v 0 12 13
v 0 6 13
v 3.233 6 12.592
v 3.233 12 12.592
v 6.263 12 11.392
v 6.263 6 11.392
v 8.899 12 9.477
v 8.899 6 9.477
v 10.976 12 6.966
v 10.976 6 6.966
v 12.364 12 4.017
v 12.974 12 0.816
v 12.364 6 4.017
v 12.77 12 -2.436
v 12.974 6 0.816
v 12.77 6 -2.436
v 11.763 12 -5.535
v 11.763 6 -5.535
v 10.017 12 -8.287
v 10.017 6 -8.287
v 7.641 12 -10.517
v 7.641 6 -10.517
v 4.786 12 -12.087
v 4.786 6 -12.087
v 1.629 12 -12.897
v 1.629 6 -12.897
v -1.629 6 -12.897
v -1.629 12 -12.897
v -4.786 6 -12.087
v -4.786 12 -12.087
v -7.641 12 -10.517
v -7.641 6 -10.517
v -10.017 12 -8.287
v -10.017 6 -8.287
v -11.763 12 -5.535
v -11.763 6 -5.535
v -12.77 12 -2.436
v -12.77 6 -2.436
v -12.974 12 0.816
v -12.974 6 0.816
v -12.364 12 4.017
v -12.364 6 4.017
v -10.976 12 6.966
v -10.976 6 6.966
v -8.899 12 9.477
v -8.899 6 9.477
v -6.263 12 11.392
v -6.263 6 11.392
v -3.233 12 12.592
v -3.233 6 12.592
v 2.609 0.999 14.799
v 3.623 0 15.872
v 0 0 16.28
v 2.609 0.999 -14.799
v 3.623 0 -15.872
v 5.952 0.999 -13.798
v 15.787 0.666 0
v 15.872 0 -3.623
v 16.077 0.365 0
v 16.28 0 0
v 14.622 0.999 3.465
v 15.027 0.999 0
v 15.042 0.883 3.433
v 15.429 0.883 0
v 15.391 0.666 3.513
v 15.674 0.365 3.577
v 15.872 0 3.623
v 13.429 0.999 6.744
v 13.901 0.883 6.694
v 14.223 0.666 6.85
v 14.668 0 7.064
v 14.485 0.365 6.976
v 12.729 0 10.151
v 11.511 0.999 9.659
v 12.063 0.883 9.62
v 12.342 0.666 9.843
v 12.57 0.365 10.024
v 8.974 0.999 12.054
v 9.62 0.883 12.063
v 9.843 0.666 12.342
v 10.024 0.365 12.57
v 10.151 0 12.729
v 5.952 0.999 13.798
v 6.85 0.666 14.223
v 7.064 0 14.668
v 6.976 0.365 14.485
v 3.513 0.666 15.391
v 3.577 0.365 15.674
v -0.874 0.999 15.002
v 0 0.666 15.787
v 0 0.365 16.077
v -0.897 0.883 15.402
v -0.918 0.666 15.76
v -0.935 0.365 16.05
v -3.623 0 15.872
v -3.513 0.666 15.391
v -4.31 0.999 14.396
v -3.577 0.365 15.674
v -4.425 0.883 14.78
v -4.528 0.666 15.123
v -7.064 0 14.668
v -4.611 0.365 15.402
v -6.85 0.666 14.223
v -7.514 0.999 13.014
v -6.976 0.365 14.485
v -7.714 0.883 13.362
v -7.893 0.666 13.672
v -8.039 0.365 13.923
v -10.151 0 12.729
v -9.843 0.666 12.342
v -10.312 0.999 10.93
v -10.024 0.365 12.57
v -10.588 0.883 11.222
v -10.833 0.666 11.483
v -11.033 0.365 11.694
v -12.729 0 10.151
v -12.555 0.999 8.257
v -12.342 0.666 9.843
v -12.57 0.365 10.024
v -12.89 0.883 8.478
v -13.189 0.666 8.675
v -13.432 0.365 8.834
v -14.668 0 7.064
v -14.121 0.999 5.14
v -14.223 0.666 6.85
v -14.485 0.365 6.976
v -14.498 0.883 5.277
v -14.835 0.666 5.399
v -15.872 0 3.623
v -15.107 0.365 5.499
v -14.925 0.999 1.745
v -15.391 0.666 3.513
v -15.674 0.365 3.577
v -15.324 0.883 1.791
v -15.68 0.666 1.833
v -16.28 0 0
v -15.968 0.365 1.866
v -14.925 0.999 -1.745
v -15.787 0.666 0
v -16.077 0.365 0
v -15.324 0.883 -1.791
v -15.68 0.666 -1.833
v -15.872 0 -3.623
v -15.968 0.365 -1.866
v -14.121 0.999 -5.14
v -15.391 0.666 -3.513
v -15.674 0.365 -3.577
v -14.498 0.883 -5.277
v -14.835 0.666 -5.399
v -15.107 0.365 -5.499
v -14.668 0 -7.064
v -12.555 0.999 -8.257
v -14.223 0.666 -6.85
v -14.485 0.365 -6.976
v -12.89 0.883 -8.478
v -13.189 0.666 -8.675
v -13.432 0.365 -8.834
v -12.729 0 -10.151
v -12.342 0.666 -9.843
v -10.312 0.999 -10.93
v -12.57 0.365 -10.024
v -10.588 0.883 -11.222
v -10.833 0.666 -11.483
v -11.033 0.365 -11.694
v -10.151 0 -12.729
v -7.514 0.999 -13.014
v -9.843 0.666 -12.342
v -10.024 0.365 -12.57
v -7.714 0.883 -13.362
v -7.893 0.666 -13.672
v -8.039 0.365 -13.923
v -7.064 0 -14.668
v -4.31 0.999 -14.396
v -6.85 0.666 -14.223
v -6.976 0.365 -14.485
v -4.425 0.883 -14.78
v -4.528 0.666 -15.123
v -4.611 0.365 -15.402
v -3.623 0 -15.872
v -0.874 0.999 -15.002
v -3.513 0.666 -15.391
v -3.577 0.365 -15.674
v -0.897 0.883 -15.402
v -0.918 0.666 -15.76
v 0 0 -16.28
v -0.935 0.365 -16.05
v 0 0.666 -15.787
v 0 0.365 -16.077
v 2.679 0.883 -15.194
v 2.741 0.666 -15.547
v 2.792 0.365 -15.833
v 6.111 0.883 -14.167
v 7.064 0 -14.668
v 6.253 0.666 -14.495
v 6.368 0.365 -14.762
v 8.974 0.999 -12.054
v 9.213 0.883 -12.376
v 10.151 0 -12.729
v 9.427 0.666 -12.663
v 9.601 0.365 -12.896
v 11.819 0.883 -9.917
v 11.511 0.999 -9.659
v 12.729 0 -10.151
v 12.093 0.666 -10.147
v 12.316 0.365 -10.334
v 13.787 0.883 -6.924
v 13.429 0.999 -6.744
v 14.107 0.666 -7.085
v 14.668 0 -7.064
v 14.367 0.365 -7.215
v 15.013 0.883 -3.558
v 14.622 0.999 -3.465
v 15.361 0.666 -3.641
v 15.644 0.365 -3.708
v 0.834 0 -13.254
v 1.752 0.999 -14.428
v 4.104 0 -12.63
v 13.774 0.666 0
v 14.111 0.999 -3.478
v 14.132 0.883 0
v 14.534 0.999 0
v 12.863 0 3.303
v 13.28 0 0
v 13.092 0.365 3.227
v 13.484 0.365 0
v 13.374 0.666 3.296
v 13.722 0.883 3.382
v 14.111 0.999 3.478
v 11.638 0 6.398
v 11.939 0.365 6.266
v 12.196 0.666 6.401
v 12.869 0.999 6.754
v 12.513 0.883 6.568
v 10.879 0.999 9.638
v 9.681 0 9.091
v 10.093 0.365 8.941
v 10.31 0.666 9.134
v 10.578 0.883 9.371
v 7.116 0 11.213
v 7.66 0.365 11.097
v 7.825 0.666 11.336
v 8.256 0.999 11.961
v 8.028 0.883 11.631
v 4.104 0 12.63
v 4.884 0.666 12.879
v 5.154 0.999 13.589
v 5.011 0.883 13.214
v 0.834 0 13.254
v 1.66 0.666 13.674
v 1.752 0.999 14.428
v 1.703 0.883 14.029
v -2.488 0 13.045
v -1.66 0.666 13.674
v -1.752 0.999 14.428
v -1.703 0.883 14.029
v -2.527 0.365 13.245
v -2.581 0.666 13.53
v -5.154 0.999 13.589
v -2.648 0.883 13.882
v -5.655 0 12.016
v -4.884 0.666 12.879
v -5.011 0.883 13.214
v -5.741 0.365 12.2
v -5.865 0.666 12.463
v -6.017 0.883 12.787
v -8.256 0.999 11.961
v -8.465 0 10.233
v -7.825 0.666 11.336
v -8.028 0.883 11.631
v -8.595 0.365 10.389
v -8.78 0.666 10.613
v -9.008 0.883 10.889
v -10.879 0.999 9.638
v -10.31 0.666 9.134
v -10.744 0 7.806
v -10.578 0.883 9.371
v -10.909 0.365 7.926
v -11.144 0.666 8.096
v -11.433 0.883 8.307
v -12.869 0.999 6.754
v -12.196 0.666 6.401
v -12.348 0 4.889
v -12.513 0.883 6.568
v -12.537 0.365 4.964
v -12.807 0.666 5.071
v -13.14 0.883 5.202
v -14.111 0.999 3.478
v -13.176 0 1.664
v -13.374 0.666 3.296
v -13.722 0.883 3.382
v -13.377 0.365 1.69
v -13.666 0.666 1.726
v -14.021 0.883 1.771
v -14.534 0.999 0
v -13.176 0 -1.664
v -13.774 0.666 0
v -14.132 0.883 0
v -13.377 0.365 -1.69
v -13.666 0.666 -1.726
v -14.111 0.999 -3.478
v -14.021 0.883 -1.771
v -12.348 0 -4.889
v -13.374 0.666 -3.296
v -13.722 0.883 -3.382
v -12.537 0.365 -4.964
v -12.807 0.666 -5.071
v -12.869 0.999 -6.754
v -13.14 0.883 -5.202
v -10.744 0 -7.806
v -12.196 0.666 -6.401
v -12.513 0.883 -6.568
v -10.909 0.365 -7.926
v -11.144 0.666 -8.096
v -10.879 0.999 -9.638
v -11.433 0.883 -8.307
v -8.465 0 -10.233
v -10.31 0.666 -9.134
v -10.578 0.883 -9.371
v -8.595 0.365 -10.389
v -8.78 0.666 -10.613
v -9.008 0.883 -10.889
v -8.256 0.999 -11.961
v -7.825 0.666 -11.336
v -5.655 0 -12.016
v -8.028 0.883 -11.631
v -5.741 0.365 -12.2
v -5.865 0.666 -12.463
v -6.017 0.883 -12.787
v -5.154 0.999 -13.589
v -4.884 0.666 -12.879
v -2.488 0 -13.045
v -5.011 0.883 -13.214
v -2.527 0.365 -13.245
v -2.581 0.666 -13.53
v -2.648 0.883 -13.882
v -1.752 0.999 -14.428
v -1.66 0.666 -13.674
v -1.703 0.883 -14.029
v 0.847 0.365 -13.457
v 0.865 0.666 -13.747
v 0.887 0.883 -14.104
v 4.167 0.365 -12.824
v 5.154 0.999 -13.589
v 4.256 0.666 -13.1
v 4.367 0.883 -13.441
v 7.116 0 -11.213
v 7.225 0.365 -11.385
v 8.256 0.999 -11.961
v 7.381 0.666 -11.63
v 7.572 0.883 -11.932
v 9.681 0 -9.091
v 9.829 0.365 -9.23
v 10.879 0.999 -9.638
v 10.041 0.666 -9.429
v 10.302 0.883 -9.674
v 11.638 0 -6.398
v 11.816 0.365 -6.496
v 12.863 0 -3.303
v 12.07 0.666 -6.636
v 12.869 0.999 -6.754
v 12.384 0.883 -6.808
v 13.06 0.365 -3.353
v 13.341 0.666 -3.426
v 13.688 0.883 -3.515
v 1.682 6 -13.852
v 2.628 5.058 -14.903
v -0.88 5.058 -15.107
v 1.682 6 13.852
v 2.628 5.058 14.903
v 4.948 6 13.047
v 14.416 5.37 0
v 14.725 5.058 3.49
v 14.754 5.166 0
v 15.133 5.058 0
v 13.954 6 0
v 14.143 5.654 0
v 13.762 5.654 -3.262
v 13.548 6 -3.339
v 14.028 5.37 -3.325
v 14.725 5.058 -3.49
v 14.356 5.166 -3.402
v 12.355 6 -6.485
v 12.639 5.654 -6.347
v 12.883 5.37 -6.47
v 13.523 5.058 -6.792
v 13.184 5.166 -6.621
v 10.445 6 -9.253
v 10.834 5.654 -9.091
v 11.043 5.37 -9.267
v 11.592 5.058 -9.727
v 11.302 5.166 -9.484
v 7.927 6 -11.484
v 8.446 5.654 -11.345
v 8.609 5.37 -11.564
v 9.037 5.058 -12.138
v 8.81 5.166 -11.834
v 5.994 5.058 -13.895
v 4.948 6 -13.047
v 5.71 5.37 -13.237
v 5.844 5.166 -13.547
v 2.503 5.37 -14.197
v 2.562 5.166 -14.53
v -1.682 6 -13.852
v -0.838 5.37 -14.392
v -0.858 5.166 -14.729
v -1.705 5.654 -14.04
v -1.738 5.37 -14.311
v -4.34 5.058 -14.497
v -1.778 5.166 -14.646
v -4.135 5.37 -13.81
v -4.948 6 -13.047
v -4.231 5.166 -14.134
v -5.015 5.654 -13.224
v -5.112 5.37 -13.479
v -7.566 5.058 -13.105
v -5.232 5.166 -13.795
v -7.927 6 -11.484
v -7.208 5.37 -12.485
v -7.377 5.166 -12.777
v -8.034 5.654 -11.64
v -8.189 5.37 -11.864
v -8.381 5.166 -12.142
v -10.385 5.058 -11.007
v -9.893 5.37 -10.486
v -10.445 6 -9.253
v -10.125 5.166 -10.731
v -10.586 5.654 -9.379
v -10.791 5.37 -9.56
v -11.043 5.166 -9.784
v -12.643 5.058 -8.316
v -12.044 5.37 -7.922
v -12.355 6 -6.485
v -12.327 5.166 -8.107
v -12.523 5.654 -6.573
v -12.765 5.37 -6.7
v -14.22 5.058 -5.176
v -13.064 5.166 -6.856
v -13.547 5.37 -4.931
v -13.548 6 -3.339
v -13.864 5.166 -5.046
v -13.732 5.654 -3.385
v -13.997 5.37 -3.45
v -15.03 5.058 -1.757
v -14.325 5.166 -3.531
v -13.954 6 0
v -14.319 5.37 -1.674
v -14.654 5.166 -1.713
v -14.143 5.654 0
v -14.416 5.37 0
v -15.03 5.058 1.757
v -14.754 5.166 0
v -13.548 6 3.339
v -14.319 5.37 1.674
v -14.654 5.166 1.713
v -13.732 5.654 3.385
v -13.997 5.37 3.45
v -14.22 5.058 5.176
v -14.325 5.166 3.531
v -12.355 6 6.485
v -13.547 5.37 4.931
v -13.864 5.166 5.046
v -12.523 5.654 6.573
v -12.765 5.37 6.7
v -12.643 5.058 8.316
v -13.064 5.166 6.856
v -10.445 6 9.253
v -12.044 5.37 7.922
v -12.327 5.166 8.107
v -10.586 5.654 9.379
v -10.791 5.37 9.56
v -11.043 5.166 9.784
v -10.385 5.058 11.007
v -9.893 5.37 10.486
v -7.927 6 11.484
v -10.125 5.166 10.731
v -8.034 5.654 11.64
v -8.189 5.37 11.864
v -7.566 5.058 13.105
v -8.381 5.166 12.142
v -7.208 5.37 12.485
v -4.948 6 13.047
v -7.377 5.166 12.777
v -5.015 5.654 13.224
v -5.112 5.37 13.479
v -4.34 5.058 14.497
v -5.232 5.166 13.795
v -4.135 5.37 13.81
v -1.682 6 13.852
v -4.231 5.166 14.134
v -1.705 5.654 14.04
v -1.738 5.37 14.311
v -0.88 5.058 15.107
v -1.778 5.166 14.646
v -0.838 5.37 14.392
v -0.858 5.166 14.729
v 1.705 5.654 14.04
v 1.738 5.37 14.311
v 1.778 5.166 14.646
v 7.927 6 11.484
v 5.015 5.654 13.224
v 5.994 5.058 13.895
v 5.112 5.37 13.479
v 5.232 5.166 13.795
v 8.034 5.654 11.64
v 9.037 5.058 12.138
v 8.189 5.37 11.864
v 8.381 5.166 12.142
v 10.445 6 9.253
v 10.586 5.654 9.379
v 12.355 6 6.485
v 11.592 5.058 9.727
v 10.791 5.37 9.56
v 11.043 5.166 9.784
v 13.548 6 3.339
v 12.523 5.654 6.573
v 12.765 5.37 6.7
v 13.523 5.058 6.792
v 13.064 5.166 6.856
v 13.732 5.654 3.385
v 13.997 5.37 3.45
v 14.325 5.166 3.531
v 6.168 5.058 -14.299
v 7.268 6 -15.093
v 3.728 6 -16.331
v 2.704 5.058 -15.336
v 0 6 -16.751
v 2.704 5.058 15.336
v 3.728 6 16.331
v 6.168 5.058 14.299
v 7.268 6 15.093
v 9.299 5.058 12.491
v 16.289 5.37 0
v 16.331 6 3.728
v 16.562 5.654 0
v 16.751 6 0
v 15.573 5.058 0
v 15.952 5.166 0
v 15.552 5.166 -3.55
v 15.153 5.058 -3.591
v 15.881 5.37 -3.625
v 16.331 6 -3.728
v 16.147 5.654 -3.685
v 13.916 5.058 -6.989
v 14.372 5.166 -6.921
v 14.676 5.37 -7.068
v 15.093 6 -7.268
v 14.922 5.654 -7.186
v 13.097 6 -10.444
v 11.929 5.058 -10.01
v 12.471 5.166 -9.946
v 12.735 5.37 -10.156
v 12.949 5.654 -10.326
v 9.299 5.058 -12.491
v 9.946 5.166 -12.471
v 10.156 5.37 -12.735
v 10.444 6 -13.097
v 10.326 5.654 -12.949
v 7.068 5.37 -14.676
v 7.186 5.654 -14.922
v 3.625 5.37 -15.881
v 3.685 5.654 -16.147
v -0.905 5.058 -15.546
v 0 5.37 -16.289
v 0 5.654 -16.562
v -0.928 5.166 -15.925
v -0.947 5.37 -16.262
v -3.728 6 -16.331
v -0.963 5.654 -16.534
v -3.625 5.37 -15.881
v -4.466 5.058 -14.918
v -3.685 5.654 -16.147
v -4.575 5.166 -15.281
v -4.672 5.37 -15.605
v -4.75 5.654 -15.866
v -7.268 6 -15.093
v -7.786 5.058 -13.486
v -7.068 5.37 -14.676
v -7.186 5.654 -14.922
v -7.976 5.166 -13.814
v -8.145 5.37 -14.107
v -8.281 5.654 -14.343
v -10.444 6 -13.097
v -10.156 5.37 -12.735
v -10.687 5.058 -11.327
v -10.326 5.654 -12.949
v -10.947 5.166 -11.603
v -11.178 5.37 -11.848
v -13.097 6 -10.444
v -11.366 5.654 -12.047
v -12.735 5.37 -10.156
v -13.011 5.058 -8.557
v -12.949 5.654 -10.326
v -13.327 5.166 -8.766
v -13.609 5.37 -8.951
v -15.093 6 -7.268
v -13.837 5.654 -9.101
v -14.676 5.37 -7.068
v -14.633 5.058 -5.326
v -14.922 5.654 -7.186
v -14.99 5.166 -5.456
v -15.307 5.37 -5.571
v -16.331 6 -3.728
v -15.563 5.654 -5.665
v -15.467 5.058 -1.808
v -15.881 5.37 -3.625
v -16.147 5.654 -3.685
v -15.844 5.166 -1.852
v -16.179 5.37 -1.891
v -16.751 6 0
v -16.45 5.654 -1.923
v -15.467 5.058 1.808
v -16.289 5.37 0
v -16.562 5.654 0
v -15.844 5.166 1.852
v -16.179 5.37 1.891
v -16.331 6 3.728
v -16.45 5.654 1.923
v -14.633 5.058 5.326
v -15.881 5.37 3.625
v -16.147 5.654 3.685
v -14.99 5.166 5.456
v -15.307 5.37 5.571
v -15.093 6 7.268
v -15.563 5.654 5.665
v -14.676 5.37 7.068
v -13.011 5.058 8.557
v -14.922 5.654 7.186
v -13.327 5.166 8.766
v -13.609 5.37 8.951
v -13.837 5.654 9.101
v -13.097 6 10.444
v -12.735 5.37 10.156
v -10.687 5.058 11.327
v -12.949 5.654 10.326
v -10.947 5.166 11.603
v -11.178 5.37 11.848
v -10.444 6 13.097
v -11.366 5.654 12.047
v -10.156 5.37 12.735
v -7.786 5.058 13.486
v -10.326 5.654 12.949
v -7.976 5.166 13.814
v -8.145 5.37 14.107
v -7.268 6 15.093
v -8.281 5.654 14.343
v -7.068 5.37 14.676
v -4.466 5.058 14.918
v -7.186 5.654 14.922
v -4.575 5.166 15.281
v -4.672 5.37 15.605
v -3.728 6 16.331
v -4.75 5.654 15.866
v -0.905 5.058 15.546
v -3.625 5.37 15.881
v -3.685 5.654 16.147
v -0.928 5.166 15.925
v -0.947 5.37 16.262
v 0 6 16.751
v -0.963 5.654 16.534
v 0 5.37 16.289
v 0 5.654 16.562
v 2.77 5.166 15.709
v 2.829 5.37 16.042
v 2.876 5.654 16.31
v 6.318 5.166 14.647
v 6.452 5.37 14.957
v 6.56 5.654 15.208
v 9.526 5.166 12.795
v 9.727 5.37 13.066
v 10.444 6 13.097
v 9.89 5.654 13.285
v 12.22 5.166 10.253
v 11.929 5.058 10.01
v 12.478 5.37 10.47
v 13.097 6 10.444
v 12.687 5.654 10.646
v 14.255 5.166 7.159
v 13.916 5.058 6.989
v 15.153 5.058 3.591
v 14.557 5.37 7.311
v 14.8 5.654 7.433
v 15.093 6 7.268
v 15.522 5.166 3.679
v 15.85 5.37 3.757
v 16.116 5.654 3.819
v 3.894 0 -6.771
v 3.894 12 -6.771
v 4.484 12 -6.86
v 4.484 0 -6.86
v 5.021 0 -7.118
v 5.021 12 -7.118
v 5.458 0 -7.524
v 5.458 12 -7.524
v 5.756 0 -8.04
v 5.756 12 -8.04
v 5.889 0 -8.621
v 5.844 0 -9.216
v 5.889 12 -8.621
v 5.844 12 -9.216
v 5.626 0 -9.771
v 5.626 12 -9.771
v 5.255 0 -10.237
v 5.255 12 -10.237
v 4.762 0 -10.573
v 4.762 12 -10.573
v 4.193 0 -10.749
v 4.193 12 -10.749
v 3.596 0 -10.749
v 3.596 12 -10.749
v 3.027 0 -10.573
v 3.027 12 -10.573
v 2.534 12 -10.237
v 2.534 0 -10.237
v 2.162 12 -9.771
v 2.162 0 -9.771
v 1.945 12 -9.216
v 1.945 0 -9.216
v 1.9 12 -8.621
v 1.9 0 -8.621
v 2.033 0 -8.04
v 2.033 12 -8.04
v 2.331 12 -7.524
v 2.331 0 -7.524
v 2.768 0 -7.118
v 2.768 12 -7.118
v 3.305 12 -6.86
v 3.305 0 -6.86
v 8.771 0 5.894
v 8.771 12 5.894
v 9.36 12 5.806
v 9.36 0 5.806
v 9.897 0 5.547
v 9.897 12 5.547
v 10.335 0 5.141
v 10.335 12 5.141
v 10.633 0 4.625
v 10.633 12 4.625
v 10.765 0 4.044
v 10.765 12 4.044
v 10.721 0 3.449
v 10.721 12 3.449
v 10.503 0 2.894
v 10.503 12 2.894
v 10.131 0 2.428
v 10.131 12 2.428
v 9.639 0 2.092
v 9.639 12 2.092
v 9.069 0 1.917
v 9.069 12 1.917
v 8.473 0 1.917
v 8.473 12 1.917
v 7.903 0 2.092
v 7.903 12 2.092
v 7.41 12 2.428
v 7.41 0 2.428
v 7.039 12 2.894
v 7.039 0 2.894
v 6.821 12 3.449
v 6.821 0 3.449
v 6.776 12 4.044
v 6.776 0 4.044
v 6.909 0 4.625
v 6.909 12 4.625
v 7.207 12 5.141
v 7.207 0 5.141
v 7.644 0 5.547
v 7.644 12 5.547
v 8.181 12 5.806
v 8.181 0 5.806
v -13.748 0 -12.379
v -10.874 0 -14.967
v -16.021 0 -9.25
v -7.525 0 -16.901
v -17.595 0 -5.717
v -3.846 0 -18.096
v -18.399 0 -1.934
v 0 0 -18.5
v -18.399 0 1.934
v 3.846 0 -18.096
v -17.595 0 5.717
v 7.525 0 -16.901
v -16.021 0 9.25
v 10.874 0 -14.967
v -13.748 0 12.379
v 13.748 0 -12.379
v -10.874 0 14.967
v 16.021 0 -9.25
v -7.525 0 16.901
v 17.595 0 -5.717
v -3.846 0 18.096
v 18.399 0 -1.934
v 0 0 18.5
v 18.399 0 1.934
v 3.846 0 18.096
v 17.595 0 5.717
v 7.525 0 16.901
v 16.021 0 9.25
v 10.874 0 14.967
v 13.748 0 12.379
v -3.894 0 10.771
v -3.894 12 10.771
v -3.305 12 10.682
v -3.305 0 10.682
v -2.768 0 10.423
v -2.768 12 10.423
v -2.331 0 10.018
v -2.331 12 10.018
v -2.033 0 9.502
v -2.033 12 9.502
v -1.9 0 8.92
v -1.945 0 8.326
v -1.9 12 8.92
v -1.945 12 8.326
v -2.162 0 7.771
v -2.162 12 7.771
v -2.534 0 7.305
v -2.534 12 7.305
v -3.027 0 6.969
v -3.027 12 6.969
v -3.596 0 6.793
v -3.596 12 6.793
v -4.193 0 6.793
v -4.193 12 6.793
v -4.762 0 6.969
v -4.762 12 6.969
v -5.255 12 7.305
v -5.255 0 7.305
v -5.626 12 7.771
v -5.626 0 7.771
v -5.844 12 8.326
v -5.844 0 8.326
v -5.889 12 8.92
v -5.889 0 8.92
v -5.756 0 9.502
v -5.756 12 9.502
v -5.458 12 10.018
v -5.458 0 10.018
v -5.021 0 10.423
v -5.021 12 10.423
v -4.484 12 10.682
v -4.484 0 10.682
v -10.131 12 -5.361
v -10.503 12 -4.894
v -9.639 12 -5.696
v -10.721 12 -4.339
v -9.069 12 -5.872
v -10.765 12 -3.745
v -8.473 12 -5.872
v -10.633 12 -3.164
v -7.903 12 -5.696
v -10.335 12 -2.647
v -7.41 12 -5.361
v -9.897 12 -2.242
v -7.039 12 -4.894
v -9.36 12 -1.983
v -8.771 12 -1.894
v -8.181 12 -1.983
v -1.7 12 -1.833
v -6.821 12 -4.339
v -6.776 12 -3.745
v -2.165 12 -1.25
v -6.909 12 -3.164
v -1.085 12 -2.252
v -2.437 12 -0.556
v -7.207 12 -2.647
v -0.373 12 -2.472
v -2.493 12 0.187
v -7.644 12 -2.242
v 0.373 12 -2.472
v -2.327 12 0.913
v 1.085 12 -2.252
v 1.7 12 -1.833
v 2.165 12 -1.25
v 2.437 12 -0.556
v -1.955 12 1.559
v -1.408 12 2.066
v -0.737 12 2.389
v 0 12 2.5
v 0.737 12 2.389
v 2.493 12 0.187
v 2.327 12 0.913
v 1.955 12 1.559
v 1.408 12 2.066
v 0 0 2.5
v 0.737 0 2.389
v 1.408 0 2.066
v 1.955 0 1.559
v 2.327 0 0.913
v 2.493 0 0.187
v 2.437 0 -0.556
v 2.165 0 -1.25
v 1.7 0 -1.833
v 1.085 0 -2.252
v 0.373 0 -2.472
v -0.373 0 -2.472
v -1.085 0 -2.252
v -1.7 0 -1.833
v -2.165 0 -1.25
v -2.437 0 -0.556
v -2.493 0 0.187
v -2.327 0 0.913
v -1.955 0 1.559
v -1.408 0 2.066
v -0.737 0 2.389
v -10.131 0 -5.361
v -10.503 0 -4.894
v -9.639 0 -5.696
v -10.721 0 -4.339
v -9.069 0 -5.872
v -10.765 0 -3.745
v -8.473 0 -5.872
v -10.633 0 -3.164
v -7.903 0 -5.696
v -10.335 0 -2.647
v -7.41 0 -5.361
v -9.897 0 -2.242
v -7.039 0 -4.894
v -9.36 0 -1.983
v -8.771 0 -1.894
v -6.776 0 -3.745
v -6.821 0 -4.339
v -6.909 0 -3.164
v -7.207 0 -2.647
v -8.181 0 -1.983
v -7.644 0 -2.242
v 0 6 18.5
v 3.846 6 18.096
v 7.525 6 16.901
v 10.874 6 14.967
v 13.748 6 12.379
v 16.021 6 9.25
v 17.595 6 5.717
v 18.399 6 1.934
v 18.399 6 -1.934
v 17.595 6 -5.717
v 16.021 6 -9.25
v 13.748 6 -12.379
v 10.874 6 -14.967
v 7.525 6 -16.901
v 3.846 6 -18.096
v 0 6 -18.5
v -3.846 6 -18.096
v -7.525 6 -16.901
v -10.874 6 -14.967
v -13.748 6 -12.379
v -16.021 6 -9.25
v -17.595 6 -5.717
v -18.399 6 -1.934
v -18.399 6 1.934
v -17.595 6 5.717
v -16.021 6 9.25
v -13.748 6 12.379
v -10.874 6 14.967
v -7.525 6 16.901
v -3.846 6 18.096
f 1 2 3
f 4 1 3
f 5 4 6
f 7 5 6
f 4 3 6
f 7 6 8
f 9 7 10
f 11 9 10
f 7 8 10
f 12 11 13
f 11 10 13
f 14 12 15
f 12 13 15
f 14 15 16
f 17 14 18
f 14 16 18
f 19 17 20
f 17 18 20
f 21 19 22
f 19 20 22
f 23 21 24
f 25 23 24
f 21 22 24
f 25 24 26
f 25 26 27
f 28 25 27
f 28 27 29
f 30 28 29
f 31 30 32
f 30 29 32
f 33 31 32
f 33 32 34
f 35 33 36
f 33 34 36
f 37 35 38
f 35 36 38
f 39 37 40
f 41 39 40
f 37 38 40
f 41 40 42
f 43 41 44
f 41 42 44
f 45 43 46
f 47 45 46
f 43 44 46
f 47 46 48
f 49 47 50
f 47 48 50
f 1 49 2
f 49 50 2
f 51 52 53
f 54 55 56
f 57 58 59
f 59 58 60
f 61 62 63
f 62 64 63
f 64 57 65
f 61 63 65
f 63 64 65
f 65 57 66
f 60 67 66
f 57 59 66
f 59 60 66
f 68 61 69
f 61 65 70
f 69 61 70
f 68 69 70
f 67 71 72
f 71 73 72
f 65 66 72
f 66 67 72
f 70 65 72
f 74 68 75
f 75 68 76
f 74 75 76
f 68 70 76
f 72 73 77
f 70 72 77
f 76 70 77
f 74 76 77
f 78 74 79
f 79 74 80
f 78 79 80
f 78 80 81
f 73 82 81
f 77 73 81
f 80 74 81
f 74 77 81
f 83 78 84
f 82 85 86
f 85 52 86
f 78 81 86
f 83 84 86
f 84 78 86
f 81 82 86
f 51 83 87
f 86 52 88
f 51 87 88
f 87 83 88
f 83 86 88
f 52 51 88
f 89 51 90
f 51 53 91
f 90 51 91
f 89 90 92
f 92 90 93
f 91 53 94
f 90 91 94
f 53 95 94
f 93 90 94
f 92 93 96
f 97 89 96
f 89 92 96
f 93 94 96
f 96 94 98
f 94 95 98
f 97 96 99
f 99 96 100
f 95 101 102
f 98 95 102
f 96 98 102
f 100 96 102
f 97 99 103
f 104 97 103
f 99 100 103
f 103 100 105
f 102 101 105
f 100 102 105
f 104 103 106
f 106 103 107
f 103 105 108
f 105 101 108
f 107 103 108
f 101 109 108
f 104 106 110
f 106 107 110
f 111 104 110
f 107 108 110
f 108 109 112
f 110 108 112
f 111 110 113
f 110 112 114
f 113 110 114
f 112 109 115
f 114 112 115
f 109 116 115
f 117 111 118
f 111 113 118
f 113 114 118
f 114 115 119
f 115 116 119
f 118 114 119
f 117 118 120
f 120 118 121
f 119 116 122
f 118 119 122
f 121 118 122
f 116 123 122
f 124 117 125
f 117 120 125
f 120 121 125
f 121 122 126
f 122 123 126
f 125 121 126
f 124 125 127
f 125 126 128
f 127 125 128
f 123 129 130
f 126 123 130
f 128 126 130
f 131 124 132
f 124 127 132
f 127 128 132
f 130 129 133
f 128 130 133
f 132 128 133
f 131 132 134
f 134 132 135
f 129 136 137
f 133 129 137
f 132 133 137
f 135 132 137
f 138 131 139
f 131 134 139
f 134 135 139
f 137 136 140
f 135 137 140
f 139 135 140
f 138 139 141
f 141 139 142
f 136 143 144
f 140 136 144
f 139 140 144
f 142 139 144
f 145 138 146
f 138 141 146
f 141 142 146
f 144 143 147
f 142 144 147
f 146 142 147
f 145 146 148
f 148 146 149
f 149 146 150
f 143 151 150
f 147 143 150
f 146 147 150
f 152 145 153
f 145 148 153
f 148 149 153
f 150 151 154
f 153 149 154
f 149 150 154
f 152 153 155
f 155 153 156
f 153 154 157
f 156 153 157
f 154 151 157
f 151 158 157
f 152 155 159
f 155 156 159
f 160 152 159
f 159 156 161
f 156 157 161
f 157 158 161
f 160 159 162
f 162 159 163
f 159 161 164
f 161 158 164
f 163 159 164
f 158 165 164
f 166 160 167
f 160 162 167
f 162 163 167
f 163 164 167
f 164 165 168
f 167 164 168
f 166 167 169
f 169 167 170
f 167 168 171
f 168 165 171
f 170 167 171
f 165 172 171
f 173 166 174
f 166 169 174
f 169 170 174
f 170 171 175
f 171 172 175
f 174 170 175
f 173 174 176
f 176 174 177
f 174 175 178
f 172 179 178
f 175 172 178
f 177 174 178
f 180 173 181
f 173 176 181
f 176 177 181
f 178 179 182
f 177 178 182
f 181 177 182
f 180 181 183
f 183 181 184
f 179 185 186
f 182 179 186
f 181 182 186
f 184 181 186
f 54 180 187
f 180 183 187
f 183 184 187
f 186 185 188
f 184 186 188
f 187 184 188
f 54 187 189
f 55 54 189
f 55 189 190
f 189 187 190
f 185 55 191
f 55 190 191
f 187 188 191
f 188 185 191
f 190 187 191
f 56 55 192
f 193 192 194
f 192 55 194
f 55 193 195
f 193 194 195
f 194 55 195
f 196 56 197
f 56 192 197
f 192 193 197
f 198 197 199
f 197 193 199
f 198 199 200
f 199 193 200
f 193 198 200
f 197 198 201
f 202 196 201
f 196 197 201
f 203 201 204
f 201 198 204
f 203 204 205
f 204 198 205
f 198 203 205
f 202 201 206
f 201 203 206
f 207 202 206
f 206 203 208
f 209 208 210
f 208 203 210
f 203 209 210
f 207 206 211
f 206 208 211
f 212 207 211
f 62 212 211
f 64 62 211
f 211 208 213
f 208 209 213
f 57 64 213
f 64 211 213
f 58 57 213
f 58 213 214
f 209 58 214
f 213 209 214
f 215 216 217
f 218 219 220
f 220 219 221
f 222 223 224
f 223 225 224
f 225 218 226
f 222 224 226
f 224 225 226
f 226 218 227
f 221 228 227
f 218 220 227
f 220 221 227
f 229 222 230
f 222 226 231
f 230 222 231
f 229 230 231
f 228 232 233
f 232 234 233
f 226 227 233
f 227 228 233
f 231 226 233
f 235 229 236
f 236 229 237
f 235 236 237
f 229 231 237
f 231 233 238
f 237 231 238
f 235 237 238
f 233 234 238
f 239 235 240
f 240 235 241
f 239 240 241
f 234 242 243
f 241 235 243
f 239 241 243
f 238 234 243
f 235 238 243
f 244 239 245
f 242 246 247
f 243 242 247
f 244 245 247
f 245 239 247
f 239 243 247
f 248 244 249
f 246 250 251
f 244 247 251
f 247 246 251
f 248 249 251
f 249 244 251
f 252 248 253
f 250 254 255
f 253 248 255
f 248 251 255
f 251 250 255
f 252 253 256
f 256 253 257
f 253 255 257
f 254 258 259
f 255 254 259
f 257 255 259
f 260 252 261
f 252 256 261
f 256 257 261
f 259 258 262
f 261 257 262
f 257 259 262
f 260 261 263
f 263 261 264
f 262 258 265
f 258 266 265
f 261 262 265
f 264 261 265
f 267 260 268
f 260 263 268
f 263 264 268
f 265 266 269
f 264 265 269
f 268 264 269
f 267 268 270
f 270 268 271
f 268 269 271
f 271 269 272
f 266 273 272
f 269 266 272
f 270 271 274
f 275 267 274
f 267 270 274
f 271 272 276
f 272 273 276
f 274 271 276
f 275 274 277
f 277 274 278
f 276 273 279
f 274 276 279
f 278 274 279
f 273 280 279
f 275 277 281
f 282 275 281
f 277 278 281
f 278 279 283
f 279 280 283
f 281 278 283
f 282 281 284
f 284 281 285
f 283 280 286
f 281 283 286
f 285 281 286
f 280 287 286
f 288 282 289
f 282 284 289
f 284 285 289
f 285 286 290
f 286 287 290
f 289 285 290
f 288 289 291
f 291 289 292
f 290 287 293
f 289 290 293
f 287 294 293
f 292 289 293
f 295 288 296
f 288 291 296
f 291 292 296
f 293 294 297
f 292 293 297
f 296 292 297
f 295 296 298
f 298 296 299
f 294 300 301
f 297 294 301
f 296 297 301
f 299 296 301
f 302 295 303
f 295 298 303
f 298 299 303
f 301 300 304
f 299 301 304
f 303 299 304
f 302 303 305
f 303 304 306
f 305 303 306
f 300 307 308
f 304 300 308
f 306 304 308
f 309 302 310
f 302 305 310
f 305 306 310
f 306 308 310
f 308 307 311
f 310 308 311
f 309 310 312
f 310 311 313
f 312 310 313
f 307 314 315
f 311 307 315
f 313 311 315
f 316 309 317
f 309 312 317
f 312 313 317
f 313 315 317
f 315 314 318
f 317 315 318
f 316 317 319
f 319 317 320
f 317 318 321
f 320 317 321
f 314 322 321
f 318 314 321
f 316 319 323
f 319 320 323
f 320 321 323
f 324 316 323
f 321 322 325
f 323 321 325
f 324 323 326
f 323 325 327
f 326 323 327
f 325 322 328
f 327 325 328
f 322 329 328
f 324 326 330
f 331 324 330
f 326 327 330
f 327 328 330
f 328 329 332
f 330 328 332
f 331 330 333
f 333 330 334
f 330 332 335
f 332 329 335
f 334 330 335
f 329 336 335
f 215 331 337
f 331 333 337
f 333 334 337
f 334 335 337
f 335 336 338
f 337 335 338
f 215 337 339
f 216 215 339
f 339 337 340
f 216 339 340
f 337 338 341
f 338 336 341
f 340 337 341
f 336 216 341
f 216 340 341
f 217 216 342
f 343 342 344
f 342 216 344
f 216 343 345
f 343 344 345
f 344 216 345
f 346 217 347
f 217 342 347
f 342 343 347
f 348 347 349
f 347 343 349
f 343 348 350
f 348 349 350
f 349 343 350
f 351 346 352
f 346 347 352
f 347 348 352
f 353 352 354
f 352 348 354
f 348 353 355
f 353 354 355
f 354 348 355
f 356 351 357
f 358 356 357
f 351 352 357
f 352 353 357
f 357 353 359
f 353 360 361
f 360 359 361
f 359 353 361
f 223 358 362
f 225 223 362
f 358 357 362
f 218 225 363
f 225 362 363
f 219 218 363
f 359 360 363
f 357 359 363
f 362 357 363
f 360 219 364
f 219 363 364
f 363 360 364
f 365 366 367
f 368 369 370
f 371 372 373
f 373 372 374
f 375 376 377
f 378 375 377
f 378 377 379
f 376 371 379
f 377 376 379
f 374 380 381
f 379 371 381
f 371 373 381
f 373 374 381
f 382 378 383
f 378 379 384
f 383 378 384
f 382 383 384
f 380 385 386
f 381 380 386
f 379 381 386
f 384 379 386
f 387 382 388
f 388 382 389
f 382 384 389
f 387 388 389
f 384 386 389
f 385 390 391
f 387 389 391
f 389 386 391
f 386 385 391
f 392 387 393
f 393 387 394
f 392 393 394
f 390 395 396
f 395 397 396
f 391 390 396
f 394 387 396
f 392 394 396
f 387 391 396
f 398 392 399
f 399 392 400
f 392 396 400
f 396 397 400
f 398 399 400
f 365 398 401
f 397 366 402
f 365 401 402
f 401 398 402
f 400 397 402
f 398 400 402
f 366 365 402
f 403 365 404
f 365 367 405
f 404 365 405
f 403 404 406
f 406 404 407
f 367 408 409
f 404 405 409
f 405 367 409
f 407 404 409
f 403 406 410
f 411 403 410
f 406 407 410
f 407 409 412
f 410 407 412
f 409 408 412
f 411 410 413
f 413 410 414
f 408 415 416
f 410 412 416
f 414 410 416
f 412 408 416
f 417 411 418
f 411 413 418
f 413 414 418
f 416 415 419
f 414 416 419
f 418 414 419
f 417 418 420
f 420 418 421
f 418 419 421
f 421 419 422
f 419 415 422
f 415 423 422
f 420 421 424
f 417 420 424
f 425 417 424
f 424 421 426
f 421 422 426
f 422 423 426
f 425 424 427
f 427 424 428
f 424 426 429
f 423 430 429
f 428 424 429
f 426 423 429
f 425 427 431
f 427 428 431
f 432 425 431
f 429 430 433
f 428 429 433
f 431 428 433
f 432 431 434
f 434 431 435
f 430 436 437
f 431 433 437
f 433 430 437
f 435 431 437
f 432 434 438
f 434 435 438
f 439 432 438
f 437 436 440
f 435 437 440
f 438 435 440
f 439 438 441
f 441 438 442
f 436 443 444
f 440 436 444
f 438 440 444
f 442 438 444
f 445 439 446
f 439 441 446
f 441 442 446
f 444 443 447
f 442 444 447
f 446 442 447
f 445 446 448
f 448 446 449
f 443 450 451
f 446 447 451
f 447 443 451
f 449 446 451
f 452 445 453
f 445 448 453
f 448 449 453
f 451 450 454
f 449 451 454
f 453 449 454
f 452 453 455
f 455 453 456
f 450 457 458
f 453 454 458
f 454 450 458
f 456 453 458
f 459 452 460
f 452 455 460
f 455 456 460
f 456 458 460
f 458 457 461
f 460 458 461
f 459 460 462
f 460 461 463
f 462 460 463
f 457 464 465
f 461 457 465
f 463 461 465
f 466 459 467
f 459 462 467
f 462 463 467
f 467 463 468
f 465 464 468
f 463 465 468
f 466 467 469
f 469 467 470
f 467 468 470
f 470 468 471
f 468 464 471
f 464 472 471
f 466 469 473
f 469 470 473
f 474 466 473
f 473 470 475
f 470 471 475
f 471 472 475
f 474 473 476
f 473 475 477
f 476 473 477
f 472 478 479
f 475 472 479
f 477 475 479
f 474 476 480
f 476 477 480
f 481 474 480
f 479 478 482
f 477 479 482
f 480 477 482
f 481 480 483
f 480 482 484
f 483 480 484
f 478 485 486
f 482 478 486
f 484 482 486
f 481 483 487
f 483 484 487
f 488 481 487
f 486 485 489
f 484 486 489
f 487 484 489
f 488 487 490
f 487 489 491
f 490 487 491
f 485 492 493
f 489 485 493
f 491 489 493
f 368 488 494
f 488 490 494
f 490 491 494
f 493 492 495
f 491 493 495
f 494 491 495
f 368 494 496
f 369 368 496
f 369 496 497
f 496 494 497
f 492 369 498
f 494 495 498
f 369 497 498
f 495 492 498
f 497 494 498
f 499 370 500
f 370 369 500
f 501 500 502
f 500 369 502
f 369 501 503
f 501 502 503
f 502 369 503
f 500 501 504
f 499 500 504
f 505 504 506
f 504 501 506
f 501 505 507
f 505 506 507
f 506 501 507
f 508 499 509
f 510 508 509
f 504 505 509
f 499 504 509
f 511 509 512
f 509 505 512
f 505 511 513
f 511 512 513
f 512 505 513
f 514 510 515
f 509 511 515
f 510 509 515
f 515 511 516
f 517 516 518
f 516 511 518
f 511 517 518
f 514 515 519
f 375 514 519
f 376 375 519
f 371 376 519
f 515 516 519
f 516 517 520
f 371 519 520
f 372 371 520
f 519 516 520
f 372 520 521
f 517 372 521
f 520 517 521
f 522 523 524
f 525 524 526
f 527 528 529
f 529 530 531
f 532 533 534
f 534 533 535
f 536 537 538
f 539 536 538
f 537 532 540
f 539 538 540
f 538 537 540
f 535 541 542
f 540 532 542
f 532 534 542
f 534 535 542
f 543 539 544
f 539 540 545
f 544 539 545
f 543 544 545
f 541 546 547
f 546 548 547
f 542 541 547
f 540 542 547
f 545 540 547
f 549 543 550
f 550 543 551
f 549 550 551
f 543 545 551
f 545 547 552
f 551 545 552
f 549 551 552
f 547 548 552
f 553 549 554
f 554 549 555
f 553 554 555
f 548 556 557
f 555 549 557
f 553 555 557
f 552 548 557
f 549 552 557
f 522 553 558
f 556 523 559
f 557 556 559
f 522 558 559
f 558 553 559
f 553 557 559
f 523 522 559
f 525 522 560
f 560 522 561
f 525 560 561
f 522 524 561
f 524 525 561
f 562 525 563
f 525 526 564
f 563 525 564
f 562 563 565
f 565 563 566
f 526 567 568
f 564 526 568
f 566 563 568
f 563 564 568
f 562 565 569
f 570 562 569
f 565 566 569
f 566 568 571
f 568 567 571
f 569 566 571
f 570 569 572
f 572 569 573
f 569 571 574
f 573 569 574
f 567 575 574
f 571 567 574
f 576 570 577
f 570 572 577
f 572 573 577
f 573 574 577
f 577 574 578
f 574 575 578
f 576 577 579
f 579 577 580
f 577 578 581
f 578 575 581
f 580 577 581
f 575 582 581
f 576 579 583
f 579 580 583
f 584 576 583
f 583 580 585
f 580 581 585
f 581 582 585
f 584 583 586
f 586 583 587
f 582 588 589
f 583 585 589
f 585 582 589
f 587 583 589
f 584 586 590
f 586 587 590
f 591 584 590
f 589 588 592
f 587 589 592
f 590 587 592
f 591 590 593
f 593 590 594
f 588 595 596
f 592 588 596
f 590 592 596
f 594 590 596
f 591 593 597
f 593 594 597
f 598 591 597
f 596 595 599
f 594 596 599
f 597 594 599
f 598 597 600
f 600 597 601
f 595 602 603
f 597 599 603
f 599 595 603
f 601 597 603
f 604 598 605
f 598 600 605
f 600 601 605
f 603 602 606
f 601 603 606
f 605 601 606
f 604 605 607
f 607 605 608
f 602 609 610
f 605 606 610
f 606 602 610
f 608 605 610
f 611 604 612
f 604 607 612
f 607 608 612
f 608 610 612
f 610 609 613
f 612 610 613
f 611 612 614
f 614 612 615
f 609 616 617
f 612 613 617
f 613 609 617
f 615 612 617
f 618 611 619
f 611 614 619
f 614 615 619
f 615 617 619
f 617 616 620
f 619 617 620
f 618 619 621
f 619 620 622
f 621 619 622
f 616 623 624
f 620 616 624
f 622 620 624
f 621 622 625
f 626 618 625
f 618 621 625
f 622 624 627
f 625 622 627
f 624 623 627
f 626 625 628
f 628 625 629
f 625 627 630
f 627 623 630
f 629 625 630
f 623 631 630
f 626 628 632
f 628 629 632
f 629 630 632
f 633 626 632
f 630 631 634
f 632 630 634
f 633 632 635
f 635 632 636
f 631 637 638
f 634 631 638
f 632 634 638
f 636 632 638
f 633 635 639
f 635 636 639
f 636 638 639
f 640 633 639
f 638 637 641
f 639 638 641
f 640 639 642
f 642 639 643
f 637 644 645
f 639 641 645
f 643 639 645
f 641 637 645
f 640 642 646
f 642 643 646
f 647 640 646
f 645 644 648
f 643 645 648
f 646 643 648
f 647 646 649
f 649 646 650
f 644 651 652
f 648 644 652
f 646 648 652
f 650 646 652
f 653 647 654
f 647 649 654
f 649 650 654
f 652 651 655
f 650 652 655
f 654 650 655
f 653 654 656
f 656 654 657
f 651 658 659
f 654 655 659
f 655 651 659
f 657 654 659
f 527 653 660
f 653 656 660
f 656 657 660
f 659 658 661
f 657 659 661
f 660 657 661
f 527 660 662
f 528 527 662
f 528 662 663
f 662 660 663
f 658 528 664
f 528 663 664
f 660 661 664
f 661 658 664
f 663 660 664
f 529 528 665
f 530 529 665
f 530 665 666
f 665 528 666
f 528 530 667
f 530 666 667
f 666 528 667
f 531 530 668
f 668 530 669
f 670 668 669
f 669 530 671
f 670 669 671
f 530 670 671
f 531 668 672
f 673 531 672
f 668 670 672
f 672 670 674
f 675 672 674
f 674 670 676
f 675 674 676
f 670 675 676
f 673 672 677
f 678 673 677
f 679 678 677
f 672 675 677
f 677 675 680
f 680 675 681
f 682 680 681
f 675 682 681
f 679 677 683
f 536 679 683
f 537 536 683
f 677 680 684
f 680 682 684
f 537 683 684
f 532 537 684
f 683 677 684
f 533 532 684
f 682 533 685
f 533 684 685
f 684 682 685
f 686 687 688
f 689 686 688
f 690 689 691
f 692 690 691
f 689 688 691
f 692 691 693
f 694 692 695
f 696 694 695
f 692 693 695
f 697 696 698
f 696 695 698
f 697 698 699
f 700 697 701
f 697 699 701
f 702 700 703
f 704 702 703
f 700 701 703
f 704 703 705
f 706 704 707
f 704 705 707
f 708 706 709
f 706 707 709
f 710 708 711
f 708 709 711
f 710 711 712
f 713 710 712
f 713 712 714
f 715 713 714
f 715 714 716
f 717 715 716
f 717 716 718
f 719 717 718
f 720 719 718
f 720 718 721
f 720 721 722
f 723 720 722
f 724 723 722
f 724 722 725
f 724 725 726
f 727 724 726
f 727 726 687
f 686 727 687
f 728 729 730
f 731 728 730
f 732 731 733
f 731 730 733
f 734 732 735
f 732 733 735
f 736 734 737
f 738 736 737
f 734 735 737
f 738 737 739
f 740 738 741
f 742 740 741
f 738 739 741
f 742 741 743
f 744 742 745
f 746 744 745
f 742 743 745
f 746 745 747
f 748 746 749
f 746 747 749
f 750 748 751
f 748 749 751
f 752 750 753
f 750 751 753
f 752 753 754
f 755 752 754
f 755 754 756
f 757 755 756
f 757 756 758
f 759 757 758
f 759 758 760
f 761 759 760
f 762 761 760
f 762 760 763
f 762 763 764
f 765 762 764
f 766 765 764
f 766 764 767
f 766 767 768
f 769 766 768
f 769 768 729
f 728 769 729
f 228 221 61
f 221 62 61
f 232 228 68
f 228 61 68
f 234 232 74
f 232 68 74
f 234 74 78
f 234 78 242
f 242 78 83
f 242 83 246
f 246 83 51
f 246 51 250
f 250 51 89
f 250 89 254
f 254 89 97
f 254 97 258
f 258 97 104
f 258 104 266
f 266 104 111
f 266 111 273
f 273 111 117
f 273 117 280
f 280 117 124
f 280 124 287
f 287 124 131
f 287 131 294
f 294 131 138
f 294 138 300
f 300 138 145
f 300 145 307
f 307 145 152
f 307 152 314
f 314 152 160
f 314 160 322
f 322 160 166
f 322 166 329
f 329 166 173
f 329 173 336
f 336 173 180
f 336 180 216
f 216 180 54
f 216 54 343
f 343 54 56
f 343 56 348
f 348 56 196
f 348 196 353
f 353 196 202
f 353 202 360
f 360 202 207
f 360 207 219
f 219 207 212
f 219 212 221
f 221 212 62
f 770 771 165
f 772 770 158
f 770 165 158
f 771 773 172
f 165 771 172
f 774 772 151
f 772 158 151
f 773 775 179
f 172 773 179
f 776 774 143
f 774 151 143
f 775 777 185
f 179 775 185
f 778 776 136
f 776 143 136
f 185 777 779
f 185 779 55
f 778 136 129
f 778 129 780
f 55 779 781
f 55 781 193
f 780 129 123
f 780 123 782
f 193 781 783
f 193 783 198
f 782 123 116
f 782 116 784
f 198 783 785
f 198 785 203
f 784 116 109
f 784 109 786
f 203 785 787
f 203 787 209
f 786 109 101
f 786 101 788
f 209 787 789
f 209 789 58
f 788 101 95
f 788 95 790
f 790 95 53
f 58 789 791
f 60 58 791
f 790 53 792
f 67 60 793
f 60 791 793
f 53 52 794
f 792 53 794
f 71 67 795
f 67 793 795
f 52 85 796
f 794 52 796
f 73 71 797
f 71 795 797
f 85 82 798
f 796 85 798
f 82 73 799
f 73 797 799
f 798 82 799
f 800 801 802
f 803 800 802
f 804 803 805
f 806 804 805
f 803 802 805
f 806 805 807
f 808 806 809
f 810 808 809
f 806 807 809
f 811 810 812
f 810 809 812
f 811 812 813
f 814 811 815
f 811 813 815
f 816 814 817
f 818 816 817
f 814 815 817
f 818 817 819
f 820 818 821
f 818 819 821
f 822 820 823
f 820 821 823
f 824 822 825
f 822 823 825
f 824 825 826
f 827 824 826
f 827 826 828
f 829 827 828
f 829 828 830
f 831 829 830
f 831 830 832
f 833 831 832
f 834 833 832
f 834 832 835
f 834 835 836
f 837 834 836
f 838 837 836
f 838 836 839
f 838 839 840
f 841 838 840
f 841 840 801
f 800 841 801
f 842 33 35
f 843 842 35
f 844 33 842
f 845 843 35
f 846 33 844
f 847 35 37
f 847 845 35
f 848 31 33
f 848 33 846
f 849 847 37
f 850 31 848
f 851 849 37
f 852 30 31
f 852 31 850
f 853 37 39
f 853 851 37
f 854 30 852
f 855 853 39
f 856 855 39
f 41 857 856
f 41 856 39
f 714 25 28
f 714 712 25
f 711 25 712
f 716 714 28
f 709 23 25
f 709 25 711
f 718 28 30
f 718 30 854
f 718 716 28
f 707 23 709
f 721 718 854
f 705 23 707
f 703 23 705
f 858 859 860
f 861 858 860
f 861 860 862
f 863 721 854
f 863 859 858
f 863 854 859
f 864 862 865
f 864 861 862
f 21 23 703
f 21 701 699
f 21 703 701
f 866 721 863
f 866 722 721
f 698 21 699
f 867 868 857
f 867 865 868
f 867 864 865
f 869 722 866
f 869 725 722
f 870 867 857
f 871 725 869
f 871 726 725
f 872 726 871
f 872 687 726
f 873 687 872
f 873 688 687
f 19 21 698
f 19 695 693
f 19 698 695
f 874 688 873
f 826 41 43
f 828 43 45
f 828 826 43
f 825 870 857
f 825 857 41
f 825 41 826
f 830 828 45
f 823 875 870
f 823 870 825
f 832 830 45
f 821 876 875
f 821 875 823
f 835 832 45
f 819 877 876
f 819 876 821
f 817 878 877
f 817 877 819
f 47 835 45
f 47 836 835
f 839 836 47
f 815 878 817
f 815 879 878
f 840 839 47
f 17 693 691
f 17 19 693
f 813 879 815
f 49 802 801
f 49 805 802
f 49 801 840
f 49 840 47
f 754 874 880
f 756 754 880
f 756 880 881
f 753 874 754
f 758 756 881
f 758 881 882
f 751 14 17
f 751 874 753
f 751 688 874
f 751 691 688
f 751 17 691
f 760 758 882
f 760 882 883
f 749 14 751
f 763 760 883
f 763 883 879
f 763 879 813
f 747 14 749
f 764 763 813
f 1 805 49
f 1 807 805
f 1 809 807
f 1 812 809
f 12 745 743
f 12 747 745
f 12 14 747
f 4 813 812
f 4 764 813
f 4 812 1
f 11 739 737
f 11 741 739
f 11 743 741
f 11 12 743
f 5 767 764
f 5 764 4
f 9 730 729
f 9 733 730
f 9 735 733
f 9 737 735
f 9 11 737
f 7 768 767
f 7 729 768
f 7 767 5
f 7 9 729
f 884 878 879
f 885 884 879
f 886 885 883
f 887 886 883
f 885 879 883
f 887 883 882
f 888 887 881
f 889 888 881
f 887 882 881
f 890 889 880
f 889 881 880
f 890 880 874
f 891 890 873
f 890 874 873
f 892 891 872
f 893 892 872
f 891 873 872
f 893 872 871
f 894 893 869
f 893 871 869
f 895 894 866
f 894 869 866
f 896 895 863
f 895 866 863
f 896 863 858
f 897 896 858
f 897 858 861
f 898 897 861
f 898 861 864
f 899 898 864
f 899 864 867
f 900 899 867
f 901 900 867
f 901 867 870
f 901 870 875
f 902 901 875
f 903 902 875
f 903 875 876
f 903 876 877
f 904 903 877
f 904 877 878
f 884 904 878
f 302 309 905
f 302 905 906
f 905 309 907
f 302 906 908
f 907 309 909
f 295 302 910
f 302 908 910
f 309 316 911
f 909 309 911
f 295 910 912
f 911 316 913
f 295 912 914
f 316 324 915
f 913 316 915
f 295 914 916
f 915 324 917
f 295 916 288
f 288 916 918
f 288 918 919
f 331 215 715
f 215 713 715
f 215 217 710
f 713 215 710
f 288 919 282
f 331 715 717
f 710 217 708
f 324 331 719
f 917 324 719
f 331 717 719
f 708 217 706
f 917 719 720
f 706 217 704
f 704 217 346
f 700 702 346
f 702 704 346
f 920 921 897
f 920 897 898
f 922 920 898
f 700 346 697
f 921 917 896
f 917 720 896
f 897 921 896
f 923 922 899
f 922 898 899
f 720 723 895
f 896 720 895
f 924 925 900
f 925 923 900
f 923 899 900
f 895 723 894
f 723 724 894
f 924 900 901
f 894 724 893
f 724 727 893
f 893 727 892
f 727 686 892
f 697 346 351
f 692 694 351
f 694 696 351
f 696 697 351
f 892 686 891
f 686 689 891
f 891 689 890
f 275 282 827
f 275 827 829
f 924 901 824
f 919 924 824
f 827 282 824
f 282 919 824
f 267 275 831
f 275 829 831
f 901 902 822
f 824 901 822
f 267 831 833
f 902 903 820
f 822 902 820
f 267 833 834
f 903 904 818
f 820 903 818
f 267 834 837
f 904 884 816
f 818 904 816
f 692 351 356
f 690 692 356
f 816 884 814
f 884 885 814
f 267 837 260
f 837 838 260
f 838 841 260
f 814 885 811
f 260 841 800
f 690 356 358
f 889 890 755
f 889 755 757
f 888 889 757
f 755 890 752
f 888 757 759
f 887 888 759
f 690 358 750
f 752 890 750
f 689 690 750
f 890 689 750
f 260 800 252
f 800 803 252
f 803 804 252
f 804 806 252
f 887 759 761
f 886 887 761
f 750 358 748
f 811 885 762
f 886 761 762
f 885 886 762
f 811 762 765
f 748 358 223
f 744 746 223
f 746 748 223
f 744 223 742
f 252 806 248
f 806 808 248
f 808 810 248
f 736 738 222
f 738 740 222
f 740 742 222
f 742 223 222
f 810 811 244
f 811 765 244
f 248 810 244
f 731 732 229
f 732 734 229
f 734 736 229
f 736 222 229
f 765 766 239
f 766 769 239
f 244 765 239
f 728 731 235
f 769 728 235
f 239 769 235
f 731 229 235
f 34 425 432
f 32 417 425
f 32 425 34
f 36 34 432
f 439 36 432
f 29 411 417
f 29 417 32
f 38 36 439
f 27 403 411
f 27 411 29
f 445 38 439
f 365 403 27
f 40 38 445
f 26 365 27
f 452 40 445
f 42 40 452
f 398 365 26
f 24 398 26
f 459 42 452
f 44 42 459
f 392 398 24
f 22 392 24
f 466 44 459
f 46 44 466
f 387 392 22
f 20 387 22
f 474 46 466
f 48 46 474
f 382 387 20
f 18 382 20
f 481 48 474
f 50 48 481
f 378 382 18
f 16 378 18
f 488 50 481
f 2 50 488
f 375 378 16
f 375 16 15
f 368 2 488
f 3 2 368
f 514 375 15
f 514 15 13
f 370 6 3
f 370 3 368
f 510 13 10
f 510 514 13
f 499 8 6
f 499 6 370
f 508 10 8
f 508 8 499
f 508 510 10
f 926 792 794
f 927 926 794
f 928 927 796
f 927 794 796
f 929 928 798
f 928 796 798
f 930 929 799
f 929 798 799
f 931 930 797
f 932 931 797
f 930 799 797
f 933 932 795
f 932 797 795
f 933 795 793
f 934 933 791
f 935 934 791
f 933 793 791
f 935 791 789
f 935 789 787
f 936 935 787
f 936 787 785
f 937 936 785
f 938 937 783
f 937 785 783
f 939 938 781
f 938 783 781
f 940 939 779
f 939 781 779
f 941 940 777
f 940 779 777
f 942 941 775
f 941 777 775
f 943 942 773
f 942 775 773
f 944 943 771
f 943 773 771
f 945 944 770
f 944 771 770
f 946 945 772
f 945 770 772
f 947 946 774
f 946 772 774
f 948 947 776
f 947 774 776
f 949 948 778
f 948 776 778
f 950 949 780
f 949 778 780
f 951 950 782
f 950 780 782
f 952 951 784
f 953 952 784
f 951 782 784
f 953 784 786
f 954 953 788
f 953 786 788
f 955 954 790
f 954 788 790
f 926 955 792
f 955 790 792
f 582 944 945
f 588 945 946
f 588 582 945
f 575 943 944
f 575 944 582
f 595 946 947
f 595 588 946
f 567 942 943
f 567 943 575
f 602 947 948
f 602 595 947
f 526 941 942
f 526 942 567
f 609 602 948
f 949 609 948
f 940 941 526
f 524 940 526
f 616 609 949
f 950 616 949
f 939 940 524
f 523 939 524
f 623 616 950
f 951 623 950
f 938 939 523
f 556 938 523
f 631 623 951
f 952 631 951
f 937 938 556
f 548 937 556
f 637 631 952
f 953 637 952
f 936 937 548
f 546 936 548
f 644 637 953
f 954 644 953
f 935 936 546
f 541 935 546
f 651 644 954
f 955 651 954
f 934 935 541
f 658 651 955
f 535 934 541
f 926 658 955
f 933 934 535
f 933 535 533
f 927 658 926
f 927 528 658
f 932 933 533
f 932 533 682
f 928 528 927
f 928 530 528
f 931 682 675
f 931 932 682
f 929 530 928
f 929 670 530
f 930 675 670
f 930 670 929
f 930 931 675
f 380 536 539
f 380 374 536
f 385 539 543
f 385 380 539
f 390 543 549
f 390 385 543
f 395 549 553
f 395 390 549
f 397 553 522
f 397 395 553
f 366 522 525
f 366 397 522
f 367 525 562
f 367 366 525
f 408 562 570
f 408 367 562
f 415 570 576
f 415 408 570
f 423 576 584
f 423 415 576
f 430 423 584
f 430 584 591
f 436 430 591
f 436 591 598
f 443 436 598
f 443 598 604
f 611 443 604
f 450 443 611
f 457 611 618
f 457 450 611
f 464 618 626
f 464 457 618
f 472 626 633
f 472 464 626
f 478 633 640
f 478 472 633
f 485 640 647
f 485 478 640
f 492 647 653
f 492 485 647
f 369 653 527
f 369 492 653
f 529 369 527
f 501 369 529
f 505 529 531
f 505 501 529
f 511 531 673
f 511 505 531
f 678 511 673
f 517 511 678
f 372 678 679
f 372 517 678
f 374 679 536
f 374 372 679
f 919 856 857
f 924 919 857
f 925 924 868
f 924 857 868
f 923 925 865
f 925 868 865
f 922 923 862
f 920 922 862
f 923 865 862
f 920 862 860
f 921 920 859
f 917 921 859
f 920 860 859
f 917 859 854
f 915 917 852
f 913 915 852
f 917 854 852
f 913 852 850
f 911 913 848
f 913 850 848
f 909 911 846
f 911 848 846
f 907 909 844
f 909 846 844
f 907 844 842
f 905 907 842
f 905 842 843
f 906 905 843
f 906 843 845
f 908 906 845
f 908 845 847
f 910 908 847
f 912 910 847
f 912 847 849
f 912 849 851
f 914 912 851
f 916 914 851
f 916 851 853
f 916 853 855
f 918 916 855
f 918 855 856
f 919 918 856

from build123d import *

# Parameters (mm, degrees)
SKETCH_1_R          = 18.5
EXTRUDE_1_DEPTH     = 6
SKETCH_6_R          = 13
EXTRUDE_2_DEPTH     = 6
SKETCH_8_R          = 2.5
SKETCH_8_R_2        = 2
CUT_EXTRUDE_1_DEPTH = 29.783675971


with BuildPart() as part:
    # Эскиз1 → Вытянуть1 (new body)
    with BuildSketch(Plane(origin=(0, 0, 0), x_dir=(1, 0, 0), z_dir=(0, 1, 0))):
        with Locations(Location((0, 0, 0), (0, 0, 270))):
            Circle(SKETCH_1_R)
    extrude(amount=EXTRUDE_1_DEPTH)

    # Вырез-По траектории1: sweep along a path in Эскиз3
    with BuildLine(Plane.XZ) as sweep_1_path:
        CenterArc((0, 0), 14.780391545, 0, 360)
    # Эскиз2 → Вырез-По траектории1 (sweep, cut)
    with BuildSketch(Plane.XY):
        with BuildLine():
            Line((-16.280391545, 0), (-13.280391545, 0))
            ThreePointArc((-13.280391545, 0), (-13.774210945, 0.666341341), (-14.533760145, 0.999438018))
            Line((-14.533760145, 0.999438018), (-15.027022944, 0.999438018))
            ThreePointArc((-15.027022944, 0.999438018), (-15.786572145, 0.666341341), (-16.280391545, 0))
        make_face()
    sweep(path=sweep_1_path.line, mode=Mode.SUBTRACT)

    # Вырез-По траектории2: sweep along a path in Эскиз5
    with BuildLine(Plane(origin=(0, 6, 0), x_dir=(1, 0, 0), z_dir=(0, 1, 0))) as sweep_2_path:
        CenterArc((0, 0), 15.352645825, 0, 360)
    # Эскиз4 → Вырез-По траектории2 (sweep, cut)
    with BuildSketch(Plane.XY):
        with BuildLine():
            Line((-16.751489622, 6), (-13.953802029, 6))
            ThreePointArc((-13.953802029, 6), (-14.416118652, 5.369797379), (-15.13270948, 5.05772433))
            Line((-15.13270948, 5.05772433), (-15.572582171, 5.05772433))
            ThreePointArc((-15.572582171, 5.05772433), (-16.289172999, 5.369797379), (-16.751489622, 6))
        make_face()
    sweep(path=sweep_2_path.line, mode=Mode.SUBTRACT)

    # Эскиз6 → Вытянуть2 (add)
    with BuildSketch(Plane(origin=(0, 6, 0), x_dir=(1, 0, 0), z_dir=(0, 1, 0))):
        with Locations(Location((0, 0, 0), (0, 0, 270))):
            Circle(SKETCH_6_R)
    extrude(amount=EXTRUDE_2_DEPTH)

    # Эскиз8 → Вырез-Вытянуть1 (cut, through all)
    with BuildSketch(Plane(origin=(0, 12, 0), x_dir=(1, 0, 0), z_dir=(0, 1, 0))):
        with Locations(Location((0, 0, 0), (0, 0, 270))):
            Circle(SKETCH_8_R)
        with Locations(Location((-3.894424366, -8.770838888, 0), (0, 0, 270))):
            Circle(SKETCH_8_R_2)
        with Locations(Location((8.770838888, -3.894424366, 0), (0, 0, 270))):
            Circle(SKETCH_8_R_2)
        with Locations(Location((3.894424366, 8.770838888, 0), (0, 0, 270))):
            Circle(SKETCH_8_R_2)
        with Locations(Location((-8.770838888, 3.894424366, 0), (0, 0, 270))):
            Circle(SKETCH_8_R_2)
    extrude(amount=-CUT_EXTRUDE_1_DEPTH, mode=Mode.SUBTRACT)


solid = part.part
